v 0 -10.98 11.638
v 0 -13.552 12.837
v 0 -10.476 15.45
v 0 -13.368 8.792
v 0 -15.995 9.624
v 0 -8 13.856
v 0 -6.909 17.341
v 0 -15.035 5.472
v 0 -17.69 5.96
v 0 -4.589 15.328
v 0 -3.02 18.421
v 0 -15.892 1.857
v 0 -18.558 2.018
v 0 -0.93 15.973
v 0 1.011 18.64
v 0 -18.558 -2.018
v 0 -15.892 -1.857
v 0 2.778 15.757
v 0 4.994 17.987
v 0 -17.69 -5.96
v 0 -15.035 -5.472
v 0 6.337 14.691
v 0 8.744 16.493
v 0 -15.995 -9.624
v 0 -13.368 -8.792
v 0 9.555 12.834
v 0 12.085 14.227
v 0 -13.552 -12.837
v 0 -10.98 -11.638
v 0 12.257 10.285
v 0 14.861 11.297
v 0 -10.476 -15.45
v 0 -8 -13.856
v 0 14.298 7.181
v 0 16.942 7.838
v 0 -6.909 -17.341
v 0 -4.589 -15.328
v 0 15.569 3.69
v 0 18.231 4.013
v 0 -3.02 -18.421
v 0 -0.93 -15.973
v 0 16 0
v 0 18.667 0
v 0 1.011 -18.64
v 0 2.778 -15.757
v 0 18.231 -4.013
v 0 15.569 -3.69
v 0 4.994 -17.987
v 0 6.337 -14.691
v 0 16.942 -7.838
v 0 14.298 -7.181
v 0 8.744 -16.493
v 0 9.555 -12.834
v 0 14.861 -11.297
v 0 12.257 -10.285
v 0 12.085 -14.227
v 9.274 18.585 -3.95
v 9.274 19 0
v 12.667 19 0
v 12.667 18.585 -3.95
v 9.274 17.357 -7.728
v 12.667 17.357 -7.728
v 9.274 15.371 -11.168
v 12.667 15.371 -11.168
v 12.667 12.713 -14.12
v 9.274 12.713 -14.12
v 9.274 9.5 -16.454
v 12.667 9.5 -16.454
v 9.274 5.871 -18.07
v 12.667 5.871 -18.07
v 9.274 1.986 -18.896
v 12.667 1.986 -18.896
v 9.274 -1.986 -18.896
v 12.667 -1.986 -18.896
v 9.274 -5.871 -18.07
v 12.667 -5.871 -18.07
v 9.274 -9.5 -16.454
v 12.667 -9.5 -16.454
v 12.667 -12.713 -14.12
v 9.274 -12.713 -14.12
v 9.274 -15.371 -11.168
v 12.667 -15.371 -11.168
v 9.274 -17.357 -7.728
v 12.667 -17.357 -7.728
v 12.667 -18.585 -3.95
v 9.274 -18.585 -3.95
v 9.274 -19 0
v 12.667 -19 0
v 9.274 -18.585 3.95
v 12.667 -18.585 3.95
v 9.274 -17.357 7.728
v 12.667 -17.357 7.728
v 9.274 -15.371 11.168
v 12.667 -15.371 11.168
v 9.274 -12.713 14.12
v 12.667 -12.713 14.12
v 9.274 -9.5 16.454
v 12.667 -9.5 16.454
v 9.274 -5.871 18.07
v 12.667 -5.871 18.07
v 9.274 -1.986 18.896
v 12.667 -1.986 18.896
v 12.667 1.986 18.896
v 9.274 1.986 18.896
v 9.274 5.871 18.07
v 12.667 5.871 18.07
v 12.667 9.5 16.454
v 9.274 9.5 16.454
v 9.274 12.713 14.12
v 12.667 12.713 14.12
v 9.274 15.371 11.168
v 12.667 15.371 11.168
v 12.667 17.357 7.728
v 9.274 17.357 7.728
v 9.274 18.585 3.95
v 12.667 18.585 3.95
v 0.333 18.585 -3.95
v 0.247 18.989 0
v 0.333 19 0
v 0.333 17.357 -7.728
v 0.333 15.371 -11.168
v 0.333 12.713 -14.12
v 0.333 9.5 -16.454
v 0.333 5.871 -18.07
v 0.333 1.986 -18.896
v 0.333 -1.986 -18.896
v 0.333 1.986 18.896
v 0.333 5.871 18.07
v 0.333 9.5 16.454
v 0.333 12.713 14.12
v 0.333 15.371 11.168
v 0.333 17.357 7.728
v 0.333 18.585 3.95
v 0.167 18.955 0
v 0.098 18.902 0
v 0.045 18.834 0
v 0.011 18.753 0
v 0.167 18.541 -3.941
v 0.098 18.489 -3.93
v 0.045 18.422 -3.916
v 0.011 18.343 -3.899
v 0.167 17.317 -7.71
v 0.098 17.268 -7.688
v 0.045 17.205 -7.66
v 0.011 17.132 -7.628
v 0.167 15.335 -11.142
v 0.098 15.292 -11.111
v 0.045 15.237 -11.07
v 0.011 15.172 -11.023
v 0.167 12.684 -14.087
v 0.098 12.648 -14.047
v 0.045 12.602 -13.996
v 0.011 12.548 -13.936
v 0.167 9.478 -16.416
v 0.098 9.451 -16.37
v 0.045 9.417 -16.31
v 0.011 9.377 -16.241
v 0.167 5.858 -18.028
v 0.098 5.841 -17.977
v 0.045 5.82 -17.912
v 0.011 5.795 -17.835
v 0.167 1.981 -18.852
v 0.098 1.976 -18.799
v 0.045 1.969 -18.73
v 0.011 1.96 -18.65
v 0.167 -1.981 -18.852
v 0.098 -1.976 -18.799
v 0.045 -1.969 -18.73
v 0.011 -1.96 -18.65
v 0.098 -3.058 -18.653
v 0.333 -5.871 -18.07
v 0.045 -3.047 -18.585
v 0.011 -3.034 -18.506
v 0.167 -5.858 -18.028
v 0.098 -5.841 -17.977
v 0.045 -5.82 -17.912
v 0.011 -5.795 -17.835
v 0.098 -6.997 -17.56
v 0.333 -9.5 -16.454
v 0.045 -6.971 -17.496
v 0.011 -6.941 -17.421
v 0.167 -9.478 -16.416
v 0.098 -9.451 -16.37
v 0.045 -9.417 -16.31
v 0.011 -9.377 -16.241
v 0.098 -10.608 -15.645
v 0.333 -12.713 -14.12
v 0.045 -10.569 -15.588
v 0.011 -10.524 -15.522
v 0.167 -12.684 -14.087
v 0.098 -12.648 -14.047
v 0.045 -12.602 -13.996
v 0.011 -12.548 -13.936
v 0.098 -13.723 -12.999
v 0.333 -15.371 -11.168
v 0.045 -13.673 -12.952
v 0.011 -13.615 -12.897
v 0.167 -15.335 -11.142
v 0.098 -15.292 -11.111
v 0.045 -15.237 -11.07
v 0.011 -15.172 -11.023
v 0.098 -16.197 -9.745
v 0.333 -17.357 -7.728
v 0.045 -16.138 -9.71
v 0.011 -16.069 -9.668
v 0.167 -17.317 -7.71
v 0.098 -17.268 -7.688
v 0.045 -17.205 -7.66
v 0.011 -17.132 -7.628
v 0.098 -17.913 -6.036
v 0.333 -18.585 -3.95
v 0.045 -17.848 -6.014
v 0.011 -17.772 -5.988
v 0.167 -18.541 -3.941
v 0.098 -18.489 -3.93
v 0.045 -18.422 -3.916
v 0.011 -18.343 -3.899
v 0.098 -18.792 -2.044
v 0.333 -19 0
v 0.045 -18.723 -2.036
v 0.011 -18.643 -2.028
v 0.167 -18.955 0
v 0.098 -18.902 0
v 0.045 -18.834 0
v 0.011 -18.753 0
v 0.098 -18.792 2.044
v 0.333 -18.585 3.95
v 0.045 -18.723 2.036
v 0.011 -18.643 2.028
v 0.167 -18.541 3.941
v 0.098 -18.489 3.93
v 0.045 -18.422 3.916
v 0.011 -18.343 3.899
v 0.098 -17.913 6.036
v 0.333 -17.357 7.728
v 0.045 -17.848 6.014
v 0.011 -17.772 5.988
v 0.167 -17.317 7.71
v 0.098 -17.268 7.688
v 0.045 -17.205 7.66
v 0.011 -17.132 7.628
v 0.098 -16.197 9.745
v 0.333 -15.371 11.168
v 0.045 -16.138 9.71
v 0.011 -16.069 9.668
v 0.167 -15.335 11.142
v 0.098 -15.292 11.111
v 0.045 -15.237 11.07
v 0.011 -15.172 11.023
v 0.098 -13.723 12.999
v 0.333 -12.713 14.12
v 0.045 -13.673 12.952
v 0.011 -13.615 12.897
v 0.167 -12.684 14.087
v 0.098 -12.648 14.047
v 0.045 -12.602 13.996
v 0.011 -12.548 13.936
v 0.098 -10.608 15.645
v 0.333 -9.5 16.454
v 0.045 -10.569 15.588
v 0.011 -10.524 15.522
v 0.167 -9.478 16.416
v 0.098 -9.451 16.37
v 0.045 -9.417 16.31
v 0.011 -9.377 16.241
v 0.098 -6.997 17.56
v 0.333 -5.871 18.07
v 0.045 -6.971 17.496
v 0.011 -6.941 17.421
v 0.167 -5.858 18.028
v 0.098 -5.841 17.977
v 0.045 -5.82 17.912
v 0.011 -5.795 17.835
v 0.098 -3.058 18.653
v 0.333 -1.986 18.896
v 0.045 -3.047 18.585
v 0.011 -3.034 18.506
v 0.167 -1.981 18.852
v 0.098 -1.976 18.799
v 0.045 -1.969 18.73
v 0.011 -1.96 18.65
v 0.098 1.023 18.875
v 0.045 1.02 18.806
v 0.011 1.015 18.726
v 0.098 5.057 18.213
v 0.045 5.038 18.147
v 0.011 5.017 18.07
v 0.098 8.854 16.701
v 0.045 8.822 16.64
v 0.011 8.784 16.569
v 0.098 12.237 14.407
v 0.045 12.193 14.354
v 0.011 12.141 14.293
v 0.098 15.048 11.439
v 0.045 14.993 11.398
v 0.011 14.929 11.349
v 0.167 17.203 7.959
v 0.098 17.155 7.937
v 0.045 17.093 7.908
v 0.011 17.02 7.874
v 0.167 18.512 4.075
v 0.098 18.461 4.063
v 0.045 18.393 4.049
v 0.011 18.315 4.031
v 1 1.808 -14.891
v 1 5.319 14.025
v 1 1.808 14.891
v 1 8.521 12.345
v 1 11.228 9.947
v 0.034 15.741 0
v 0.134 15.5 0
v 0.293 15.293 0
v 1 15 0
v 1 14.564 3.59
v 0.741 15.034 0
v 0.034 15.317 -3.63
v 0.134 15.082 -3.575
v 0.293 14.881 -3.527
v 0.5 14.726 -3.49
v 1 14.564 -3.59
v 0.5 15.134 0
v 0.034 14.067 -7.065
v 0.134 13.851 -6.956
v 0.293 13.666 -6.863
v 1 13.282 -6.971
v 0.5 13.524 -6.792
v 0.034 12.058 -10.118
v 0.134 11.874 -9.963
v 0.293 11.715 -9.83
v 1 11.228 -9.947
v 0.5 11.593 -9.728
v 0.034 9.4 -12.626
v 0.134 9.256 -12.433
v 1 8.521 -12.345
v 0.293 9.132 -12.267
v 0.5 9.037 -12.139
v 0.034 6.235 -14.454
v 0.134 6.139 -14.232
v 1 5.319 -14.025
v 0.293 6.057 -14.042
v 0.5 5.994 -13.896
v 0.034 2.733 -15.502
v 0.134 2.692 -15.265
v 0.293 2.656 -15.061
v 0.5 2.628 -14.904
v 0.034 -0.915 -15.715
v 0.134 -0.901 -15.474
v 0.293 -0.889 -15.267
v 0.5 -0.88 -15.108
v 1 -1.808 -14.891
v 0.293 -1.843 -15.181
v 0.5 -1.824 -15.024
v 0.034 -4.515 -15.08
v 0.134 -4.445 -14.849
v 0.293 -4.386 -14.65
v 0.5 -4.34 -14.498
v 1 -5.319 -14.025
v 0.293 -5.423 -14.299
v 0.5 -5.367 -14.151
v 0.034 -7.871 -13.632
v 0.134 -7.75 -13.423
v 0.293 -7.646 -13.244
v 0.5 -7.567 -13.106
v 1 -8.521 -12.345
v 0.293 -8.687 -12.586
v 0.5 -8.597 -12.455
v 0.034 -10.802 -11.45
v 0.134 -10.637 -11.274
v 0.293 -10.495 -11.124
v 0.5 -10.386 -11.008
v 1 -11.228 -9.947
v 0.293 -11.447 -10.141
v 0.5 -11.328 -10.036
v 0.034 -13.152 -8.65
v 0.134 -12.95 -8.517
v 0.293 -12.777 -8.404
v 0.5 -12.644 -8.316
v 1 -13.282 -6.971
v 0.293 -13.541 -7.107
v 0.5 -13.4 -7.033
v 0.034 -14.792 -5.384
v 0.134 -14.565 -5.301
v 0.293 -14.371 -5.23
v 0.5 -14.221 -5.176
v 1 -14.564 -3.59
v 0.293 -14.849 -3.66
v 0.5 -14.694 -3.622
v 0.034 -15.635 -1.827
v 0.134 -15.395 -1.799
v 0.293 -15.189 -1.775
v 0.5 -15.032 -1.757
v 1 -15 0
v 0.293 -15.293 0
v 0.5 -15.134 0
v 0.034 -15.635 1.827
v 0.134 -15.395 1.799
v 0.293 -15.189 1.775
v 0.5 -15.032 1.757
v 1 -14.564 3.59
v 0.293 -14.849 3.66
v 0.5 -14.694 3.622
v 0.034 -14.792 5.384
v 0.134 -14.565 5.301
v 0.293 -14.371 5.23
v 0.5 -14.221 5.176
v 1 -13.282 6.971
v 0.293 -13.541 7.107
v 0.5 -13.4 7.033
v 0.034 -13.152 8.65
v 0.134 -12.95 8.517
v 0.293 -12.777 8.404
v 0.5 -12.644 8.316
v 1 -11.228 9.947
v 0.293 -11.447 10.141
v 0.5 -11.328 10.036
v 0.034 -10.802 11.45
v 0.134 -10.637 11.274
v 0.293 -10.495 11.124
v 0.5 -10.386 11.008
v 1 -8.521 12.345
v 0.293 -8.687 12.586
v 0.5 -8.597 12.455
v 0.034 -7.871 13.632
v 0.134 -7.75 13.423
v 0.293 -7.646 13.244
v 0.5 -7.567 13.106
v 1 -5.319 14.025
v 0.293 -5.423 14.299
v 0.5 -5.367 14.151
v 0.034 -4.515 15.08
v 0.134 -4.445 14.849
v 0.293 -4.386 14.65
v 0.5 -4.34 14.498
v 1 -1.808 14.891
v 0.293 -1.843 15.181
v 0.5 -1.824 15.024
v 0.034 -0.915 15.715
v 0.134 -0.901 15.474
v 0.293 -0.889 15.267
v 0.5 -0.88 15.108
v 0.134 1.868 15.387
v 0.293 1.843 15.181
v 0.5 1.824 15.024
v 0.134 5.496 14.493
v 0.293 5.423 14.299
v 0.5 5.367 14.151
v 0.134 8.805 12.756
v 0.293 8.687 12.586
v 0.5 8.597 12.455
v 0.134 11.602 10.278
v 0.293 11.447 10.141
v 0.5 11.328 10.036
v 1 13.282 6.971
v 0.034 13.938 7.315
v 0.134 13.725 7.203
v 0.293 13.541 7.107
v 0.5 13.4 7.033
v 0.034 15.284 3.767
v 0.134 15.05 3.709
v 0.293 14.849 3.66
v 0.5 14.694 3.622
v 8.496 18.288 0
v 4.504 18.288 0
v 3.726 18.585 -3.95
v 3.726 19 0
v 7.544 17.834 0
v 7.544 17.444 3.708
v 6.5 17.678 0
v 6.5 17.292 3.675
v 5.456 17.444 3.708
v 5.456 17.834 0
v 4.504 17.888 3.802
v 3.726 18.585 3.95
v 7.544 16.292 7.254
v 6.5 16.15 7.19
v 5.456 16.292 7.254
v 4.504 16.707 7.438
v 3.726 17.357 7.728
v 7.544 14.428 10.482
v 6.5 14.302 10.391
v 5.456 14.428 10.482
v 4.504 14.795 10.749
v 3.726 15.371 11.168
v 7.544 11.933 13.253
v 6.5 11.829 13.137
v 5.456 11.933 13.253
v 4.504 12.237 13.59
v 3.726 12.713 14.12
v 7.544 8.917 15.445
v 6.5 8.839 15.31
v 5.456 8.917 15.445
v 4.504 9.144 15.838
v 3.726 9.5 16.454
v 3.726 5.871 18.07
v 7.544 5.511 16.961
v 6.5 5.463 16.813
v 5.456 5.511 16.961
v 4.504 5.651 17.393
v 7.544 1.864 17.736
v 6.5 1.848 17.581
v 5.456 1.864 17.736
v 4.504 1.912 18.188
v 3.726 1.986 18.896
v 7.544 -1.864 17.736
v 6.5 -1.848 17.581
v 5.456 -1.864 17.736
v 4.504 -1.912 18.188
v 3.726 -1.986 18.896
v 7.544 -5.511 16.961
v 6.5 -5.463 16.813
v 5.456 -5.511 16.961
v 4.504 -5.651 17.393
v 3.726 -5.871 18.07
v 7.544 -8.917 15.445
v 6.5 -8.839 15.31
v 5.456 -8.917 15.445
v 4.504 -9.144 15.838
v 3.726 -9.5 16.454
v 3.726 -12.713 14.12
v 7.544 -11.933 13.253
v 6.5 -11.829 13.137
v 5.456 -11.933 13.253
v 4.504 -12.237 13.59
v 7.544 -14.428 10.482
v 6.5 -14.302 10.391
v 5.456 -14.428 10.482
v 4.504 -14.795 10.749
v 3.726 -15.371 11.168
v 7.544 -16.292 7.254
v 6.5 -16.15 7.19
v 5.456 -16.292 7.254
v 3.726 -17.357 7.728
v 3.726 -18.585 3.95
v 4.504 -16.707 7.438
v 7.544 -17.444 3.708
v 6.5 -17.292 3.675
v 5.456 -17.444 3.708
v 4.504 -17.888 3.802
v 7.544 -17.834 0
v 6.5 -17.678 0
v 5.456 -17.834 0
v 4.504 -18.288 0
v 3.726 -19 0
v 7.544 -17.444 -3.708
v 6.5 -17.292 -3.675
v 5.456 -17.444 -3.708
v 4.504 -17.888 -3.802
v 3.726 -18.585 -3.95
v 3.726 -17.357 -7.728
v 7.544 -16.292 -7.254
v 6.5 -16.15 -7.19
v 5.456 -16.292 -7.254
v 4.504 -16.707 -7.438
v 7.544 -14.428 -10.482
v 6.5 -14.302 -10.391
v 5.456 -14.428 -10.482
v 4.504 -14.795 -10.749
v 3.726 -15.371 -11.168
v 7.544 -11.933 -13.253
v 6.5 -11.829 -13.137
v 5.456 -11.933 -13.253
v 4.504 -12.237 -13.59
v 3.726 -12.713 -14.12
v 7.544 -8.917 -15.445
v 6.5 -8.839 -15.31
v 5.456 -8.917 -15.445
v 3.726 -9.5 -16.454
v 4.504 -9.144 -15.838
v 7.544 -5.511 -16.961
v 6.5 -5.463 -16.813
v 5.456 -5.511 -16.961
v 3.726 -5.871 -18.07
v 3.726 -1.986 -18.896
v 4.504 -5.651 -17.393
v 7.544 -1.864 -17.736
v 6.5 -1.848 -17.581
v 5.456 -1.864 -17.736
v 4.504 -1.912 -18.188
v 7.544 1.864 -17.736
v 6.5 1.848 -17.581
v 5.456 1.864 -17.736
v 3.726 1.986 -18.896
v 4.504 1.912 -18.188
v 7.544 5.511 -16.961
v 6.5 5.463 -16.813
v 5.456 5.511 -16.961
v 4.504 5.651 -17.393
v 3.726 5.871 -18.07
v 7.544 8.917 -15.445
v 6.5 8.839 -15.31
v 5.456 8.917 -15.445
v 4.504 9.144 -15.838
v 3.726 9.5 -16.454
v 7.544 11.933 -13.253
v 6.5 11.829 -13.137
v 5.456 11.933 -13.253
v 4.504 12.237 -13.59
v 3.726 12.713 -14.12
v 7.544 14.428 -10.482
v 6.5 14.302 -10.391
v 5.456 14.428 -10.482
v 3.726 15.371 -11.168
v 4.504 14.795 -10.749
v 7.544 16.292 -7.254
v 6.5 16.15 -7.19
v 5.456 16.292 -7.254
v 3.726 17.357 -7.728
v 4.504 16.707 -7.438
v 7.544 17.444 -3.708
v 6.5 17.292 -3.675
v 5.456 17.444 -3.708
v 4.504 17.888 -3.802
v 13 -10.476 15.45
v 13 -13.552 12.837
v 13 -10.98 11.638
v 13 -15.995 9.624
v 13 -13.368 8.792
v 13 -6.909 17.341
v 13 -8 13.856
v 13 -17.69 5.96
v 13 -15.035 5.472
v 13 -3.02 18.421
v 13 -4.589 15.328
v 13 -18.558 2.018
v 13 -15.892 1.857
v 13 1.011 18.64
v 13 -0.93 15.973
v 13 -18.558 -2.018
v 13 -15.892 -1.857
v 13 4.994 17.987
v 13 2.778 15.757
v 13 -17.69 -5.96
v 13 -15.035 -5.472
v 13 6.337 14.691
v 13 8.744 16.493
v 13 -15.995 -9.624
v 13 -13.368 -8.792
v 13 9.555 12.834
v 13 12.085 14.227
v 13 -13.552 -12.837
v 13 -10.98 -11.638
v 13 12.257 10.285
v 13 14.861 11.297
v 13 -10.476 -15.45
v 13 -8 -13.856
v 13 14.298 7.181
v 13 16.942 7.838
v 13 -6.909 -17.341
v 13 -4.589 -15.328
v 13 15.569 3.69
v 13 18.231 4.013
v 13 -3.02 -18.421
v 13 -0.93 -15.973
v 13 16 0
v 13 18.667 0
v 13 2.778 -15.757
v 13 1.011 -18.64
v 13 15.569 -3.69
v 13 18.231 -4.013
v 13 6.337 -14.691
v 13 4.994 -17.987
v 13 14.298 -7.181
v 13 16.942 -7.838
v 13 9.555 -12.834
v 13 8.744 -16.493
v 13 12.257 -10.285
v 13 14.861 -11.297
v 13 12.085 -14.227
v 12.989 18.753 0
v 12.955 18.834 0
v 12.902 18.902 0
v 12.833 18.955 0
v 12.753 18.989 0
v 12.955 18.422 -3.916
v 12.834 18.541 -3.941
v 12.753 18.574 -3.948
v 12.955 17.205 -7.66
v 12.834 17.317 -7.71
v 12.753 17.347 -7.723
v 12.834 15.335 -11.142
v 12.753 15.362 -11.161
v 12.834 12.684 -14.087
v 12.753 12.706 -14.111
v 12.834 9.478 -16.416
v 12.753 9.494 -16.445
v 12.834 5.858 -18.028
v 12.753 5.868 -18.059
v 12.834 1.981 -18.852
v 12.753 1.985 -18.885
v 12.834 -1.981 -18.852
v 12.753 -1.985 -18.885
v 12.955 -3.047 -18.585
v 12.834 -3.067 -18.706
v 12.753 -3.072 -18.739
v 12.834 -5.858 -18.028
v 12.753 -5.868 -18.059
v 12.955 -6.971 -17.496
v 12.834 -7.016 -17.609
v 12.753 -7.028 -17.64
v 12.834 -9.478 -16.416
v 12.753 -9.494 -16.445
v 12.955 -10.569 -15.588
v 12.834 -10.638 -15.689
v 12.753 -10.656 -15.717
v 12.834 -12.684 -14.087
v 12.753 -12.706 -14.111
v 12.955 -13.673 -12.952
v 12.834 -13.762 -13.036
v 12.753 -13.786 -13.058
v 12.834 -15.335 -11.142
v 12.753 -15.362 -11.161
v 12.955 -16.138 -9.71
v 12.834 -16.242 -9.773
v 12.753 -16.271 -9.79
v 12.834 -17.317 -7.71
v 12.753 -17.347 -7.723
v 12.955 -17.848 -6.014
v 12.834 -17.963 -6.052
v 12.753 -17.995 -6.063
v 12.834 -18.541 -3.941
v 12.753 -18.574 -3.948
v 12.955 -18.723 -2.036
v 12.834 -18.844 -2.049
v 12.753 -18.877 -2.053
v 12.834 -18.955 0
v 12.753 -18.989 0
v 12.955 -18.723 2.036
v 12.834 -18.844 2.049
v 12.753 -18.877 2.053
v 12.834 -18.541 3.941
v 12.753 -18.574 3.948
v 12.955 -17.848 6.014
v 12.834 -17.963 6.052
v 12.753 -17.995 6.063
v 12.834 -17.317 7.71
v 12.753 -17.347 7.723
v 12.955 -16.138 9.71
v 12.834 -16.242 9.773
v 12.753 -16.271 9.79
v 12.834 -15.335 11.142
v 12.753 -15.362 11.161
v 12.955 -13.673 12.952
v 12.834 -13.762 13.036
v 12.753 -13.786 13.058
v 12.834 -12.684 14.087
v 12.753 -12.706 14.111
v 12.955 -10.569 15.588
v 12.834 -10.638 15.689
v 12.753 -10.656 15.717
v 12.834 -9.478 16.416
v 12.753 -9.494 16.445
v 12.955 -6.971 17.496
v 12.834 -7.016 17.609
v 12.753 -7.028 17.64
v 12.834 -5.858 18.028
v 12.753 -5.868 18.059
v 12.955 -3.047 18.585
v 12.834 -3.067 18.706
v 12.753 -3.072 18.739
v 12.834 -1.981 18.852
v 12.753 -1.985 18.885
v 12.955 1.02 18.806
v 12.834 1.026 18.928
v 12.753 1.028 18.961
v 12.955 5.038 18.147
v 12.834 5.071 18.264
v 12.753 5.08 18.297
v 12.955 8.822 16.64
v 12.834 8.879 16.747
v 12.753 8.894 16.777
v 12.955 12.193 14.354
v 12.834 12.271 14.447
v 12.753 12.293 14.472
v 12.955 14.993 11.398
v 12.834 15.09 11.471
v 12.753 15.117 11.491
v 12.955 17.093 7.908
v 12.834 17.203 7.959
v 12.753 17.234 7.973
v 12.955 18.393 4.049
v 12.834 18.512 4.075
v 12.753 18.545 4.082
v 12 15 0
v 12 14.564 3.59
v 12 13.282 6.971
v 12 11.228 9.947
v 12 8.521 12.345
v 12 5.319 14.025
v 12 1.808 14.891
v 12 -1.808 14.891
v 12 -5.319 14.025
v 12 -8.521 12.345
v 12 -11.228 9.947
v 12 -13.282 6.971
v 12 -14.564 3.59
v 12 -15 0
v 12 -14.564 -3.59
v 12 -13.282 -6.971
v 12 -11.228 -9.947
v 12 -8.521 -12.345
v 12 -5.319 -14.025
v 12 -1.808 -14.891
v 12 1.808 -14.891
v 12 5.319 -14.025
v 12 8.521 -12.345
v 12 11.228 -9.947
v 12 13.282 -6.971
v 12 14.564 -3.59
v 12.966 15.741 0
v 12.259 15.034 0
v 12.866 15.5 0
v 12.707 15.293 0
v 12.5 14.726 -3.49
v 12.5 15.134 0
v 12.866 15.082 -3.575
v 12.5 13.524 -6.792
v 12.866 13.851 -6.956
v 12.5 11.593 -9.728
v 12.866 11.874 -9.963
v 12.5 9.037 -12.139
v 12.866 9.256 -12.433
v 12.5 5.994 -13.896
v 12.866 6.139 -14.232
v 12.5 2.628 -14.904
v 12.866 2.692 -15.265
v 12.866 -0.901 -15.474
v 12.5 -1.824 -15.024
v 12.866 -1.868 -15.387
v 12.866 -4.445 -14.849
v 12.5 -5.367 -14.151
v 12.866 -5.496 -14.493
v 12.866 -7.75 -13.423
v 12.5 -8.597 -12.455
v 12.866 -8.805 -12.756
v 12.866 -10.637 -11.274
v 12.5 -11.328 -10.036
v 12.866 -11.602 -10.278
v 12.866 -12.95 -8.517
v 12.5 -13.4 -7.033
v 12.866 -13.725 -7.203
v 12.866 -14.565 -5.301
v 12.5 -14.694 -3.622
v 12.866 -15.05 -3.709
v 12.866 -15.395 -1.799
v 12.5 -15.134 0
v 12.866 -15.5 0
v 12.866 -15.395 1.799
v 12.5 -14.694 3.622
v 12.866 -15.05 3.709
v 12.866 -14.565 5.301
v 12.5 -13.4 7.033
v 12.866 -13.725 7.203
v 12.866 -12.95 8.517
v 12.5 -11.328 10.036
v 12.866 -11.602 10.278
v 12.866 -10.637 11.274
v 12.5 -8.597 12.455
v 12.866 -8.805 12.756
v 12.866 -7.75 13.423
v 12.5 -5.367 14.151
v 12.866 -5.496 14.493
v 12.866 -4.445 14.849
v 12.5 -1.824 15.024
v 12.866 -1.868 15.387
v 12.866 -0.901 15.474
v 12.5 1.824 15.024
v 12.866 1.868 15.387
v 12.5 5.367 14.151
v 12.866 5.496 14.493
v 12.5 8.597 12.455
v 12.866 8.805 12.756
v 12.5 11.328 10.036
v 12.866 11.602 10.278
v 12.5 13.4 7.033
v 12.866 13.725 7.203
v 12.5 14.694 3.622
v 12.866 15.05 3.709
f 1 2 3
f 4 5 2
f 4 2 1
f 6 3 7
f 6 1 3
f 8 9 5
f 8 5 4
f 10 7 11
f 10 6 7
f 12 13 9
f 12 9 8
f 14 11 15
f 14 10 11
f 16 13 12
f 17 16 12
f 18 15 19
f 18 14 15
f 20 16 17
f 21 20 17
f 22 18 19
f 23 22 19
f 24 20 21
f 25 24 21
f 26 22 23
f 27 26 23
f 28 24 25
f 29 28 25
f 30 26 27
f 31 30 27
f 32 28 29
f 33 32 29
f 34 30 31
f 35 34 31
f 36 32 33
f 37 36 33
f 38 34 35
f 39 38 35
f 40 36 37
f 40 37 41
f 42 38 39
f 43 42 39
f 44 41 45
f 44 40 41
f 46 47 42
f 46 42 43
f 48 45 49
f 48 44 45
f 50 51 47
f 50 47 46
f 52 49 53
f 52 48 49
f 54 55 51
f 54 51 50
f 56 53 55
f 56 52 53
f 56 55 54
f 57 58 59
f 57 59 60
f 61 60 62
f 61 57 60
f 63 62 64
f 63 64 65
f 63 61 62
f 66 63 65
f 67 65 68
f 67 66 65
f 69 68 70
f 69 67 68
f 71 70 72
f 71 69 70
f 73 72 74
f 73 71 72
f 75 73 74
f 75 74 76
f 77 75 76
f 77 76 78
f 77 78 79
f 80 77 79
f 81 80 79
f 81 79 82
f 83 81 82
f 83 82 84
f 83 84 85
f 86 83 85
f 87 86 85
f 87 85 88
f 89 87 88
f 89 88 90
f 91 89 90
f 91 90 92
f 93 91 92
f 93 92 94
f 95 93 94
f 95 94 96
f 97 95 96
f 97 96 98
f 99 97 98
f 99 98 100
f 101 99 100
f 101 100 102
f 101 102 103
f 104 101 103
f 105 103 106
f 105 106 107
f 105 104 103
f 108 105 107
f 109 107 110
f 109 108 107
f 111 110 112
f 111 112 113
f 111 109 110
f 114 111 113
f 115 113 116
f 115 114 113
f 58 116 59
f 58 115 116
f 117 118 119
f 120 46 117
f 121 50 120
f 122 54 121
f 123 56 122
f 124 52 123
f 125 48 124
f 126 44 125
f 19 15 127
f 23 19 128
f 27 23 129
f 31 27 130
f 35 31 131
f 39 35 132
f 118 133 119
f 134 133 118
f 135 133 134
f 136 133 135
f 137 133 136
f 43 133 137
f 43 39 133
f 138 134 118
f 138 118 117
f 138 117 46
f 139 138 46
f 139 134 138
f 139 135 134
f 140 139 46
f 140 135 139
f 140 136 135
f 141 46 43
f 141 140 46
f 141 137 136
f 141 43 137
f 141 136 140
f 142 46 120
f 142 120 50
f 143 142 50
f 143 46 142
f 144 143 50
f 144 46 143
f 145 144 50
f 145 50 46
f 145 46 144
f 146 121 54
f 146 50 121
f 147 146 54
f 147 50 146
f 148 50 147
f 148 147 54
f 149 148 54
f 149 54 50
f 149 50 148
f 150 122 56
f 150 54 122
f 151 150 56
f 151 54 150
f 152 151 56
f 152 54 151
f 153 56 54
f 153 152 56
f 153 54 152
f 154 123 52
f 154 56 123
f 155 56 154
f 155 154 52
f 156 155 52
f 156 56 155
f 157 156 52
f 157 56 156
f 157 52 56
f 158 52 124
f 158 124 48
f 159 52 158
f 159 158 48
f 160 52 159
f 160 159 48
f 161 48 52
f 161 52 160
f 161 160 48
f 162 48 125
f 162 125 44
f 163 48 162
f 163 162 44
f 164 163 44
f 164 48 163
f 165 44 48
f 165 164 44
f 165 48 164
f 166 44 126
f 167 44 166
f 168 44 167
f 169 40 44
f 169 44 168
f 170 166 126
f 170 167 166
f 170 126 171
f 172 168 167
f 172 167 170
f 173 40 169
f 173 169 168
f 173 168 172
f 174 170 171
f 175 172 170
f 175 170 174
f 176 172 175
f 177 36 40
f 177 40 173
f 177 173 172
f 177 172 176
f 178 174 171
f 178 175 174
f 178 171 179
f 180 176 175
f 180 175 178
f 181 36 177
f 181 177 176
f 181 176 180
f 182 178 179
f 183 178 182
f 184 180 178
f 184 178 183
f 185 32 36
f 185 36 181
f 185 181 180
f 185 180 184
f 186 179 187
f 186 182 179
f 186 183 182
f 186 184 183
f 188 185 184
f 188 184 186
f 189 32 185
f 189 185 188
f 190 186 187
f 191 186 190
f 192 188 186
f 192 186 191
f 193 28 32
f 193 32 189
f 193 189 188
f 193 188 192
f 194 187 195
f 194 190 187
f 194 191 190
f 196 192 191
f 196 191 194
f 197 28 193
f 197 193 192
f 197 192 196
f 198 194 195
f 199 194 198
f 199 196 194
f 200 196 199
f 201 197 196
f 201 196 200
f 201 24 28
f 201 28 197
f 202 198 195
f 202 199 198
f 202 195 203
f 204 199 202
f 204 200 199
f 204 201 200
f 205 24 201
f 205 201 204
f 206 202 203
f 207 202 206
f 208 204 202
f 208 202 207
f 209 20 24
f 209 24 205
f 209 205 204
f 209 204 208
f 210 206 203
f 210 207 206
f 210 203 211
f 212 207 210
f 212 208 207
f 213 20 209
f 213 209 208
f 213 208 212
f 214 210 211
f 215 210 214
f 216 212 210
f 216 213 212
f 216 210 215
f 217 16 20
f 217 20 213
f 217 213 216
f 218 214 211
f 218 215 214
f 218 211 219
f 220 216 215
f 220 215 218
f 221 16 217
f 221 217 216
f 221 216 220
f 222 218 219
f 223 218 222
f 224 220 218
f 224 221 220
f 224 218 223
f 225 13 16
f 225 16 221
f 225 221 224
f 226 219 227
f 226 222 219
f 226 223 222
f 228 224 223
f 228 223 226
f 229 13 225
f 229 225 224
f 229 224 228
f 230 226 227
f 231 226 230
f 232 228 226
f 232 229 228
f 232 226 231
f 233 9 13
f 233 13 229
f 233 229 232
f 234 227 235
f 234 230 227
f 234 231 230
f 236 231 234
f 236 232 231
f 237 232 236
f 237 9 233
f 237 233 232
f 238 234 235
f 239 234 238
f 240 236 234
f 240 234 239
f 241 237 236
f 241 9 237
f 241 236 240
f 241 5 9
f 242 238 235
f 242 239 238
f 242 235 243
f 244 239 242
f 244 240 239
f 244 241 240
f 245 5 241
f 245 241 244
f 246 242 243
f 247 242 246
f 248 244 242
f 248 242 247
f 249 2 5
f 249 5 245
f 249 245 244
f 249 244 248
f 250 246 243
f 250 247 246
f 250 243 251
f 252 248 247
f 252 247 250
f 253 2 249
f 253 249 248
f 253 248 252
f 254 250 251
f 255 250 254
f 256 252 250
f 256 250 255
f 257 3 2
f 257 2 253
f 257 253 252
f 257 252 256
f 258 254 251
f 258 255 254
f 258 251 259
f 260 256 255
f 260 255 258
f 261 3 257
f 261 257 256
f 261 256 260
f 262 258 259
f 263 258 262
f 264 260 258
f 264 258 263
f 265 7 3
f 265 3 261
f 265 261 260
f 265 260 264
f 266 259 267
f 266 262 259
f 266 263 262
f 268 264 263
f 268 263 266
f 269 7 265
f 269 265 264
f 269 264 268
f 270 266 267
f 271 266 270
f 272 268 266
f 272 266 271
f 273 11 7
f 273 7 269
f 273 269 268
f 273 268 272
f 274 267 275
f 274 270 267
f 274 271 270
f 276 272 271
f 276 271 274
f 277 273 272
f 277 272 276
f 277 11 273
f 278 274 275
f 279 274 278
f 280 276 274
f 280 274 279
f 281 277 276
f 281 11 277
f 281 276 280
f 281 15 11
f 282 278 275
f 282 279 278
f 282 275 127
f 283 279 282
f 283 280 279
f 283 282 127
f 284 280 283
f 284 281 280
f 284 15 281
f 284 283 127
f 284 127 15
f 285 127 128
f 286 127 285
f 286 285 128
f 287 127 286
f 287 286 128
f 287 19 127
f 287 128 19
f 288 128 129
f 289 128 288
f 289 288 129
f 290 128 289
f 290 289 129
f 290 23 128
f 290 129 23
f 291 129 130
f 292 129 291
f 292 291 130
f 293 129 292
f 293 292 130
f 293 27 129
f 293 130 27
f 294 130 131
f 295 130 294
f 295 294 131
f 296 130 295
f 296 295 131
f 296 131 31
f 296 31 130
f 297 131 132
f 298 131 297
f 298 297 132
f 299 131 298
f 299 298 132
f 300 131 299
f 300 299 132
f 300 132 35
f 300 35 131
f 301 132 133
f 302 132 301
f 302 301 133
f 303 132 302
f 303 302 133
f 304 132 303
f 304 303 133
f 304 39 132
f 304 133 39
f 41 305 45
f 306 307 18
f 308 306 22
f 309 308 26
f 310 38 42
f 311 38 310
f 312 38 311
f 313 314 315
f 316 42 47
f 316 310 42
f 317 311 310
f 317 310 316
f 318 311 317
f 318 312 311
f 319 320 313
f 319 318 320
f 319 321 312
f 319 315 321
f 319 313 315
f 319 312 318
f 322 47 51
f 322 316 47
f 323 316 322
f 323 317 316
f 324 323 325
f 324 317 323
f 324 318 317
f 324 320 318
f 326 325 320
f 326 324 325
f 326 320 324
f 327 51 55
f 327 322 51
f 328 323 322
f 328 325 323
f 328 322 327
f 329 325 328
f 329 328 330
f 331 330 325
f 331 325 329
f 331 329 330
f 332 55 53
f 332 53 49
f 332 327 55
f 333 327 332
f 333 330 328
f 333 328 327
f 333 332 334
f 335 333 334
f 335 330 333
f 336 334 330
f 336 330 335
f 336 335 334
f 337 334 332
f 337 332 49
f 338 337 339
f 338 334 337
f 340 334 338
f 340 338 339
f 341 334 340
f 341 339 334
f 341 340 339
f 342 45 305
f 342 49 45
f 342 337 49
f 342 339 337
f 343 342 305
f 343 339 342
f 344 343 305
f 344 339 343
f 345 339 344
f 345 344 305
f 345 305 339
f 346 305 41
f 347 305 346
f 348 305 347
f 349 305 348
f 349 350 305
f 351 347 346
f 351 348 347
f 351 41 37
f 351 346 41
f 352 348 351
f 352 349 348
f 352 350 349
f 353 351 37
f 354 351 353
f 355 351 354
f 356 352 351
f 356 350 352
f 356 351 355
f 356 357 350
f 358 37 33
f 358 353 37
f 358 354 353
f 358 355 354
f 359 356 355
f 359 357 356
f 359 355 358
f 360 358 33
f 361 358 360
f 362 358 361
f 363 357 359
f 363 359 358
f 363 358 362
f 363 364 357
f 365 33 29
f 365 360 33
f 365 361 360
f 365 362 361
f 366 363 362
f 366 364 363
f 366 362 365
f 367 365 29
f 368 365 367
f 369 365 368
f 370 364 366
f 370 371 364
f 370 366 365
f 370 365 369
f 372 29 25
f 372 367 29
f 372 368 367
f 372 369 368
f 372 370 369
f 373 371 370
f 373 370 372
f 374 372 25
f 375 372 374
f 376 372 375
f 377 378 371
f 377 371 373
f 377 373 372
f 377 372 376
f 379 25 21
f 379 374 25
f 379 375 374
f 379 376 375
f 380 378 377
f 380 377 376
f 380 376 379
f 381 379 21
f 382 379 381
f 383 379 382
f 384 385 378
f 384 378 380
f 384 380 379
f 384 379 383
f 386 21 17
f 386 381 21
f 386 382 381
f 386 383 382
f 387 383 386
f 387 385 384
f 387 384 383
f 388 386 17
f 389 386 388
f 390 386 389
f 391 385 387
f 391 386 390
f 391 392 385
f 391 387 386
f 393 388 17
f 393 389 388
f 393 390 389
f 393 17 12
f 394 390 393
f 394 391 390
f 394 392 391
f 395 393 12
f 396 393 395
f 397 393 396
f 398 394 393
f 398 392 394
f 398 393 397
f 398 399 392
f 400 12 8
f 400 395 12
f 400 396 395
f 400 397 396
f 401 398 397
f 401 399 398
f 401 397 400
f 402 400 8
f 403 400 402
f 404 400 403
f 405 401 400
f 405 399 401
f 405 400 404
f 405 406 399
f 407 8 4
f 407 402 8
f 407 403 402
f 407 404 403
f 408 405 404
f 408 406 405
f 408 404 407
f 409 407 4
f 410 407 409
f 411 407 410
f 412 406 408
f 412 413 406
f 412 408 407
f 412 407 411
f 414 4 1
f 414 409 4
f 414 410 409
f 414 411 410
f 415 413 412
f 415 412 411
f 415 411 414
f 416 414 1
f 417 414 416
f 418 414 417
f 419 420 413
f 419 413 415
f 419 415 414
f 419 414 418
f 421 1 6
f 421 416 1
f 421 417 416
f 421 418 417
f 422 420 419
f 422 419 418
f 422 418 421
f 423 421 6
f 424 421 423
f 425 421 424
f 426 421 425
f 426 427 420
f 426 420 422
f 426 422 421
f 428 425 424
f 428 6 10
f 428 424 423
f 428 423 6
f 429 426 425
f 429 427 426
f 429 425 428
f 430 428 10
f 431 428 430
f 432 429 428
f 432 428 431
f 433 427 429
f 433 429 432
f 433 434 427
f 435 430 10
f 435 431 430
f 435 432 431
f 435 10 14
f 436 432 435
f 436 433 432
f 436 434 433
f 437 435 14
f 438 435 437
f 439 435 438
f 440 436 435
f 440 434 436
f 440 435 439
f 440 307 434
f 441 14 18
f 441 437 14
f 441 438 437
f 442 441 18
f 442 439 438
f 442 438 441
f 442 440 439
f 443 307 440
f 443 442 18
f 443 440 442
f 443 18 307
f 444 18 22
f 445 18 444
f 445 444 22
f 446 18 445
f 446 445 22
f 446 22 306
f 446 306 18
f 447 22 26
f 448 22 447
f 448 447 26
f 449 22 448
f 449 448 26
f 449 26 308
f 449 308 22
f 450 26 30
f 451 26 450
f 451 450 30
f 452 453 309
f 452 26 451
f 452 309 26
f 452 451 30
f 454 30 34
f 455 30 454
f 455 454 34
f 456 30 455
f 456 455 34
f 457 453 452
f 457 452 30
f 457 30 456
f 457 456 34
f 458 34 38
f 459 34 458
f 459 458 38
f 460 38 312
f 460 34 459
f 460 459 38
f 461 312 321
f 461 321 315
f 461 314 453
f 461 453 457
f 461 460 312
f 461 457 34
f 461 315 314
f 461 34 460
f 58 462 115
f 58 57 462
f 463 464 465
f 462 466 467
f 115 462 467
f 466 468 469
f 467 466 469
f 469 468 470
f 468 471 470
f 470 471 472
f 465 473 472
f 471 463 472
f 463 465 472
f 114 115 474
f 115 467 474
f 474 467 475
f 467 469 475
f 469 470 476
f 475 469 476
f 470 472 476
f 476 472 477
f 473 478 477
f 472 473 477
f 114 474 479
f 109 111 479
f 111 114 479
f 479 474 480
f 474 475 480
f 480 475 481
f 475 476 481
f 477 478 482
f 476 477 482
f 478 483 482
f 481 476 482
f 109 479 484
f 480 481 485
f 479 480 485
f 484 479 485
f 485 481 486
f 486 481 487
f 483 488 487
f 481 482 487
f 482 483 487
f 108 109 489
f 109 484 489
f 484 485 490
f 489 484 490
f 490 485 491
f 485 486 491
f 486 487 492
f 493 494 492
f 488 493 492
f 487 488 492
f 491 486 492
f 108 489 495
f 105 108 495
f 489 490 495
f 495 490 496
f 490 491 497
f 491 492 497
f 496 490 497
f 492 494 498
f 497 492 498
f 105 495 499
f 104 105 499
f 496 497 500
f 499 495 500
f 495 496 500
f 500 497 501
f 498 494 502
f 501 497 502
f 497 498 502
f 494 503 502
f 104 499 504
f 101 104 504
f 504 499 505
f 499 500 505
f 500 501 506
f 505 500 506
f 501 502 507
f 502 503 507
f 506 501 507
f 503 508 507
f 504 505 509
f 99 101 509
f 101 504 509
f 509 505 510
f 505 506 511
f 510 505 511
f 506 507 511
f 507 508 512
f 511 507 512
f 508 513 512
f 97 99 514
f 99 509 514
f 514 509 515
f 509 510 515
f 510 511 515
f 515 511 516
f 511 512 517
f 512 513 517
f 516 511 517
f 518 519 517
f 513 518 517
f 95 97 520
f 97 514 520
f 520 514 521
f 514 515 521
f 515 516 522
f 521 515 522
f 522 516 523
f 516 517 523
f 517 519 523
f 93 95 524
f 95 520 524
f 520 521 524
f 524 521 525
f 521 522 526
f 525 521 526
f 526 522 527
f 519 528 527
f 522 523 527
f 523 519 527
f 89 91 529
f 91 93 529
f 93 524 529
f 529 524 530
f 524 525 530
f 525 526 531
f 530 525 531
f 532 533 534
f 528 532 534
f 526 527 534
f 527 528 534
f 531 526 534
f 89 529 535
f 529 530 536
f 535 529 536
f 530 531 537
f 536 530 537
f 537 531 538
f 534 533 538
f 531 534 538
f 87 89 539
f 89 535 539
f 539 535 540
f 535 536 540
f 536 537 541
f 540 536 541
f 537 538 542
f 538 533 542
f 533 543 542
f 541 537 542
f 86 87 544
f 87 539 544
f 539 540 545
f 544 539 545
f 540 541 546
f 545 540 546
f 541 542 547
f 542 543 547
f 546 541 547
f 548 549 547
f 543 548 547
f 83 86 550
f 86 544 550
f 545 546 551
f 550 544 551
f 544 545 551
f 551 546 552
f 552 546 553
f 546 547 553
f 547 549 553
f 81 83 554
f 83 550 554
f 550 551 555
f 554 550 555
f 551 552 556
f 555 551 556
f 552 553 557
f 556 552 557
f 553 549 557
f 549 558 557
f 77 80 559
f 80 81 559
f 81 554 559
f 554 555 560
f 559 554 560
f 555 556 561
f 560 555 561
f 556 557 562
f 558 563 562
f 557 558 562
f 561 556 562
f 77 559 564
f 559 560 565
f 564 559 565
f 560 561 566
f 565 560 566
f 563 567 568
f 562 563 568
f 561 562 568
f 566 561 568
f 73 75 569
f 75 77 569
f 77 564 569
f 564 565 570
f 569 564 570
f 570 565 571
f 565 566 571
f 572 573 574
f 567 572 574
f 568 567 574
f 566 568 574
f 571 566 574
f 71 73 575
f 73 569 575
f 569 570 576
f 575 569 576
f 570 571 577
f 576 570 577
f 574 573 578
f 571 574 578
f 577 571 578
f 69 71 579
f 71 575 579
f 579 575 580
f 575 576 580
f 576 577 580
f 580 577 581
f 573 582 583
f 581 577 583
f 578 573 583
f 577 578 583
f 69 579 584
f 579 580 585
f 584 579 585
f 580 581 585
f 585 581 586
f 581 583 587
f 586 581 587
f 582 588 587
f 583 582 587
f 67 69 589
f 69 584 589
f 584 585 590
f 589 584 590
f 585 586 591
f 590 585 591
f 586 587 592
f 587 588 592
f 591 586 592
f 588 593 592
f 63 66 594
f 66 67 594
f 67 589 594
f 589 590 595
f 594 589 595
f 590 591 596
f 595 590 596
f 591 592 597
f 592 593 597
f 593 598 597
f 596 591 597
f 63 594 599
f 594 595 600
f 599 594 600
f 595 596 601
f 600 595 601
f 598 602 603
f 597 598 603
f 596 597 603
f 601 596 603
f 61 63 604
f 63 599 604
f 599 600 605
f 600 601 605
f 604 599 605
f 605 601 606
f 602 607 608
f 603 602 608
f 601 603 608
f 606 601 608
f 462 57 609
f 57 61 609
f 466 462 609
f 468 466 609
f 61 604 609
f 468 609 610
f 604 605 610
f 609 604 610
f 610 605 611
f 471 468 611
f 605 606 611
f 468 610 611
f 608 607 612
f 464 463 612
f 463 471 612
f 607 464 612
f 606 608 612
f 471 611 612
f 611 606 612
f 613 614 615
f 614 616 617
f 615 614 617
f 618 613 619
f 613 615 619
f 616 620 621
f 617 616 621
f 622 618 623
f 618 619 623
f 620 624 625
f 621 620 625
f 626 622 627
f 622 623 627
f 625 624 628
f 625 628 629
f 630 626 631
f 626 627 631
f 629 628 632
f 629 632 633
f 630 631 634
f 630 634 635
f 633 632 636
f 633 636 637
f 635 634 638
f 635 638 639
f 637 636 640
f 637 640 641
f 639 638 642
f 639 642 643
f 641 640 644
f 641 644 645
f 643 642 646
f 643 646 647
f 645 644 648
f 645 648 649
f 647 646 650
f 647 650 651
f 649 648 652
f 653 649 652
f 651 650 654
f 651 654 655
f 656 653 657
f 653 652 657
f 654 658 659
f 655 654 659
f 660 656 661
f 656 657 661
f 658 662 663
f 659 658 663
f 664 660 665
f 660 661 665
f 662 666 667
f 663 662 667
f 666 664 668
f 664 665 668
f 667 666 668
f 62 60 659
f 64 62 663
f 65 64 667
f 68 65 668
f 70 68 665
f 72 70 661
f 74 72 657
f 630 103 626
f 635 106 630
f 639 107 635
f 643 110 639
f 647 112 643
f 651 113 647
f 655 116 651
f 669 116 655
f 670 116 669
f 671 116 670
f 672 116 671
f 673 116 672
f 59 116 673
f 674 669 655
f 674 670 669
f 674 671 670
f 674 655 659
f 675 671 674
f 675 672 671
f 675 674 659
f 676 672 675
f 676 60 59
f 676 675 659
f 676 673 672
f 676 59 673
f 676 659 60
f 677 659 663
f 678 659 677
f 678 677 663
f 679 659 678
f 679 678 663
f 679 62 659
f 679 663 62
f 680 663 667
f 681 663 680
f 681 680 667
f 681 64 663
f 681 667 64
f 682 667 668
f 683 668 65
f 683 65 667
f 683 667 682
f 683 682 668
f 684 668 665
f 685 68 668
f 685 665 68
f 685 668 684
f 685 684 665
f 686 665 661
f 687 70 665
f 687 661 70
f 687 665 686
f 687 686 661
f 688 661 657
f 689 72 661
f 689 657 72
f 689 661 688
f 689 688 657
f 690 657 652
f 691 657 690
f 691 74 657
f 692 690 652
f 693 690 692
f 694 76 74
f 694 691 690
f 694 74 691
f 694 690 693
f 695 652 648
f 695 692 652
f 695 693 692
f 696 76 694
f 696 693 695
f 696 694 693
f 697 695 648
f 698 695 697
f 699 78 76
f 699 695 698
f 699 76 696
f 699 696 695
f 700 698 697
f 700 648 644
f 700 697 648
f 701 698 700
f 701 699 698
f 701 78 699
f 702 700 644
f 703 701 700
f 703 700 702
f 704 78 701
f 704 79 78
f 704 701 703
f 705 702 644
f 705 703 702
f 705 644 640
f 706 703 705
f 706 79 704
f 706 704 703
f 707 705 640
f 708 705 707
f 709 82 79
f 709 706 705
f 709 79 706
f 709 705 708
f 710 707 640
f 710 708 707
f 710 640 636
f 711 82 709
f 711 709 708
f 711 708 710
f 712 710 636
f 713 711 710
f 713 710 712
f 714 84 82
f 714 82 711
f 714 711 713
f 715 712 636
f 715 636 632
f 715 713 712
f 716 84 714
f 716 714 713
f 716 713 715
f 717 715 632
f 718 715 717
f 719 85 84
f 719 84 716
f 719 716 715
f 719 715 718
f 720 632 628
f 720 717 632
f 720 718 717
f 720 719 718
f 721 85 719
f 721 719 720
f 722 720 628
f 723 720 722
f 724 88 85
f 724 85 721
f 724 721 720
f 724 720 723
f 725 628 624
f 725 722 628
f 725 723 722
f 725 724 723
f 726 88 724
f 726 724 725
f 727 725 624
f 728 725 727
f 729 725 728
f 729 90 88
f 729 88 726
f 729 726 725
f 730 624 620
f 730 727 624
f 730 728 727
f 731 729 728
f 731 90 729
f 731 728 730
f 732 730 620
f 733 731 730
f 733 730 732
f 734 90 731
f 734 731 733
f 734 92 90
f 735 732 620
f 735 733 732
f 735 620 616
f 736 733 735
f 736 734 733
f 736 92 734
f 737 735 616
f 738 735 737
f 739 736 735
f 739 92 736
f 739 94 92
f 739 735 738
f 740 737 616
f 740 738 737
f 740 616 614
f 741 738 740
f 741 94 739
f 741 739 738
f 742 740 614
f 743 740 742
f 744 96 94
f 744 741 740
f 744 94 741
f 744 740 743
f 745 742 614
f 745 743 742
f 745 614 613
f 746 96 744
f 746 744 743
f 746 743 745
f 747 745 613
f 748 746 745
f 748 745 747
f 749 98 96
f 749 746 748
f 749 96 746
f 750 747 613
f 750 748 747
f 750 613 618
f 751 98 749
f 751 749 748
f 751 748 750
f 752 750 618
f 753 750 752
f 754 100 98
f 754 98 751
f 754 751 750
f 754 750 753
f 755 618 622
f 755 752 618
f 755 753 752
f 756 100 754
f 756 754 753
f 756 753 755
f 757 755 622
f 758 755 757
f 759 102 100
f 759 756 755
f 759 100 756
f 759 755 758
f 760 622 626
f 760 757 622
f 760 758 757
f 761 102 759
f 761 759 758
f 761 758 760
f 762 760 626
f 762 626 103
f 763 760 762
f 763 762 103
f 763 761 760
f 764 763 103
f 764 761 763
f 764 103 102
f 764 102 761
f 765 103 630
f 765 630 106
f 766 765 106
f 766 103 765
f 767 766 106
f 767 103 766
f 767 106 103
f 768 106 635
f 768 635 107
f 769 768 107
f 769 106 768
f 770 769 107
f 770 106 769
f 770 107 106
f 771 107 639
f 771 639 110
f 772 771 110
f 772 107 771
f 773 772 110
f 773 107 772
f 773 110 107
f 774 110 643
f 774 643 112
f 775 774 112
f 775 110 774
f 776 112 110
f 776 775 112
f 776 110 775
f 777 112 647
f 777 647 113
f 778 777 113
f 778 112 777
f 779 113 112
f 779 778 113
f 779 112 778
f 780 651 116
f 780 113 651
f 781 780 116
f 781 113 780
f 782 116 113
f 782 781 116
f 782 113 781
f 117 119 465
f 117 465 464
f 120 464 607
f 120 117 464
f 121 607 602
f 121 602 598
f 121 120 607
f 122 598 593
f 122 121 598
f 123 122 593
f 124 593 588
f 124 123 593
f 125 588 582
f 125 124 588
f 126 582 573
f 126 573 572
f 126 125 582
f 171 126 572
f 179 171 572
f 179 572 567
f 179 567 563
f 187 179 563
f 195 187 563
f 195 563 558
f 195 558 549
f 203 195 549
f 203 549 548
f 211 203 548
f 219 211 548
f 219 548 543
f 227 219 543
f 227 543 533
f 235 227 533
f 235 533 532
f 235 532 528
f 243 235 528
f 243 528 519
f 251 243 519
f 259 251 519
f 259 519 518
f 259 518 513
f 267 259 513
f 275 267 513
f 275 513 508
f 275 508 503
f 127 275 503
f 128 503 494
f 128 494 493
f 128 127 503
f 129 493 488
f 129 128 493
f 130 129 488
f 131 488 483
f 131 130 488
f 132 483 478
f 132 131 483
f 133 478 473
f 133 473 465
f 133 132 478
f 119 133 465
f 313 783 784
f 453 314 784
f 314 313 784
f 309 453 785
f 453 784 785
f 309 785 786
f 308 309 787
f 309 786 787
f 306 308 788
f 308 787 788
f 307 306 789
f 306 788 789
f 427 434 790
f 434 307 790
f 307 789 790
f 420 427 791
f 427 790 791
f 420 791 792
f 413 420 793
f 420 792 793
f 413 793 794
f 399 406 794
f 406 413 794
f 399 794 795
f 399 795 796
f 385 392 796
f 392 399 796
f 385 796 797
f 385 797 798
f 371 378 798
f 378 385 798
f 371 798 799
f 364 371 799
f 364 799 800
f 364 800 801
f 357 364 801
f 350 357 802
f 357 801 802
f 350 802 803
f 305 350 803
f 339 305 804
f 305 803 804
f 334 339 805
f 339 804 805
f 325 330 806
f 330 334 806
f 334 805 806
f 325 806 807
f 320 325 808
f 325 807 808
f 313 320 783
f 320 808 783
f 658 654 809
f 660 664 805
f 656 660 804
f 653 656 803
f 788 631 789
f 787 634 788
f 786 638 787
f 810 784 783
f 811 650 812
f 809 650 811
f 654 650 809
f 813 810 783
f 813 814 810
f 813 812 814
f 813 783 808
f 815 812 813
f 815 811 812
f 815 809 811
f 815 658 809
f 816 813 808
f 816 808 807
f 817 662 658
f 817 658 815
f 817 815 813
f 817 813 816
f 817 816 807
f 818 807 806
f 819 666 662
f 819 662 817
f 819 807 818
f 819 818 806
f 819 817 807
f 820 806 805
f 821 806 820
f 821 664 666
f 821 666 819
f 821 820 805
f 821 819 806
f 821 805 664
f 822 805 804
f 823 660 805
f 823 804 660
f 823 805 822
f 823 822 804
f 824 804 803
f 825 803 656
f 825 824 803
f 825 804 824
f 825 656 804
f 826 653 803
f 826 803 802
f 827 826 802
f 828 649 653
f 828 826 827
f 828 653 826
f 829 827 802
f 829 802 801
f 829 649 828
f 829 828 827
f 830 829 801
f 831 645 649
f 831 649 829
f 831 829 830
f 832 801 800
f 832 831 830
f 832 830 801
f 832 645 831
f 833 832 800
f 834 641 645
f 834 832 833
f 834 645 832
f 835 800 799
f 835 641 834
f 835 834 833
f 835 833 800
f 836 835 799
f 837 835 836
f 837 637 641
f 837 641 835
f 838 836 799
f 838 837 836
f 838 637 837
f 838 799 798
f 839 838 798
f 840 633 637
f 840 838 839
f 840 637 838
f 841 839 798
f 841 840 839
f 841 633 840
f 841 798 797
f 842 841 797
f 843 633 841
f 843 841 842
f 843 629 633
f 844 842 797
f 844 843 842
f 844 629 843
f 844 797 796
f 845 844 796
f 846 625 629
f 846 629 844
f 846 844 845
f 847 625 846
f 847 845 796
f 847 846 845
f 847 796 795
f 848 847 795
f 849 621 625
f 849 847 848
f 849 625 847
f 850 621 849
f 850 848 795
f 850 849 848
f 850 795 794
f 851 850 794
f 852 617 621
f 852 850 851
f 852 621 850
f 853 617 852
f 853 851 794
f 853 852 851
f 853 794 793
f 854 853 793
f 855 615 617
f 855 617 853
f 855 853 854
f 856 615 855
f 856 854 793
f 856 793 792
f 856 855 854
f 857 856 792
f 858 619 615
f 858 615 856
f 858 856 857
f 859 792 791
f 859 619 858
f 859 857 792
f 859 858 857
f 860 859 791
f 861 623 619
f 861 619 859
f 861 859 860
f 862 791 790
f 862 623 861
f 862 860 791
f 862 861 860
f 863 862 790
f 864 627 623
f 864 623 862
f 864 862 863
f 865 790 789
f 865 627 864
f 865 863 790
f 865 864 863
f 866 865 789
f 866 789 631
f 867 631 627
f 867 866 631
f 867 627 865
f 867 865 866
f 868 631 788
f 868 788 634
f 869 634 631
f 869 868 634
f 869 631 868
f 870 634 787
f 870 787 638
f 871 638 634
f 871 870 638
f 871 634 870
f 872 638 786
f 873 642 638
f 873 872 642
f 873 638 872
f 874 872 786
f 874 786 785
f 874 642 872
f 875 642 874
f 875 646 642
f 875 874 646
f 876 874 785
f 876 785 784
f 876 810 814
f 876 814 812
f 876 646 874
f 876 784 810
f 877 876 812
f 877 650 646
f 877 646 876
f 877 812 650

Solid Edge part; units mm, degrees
sketch "Sketch1" plane through (0, 0, 0) normal (0, 0, 1) x (1, 0, 0)
  arc A0 (0, 16) -> (1, 15) centre (1, 16) ccw
  line L0 (1, 15) -> (12, 15)
  arc A1 (12, 15) -> (13, 16) centre (12, 16) ccw
  line L1 (13, 16) -> (13, 18.667)
  arc A2 (13, 18.667) -> (12.667, 19) centre (12.667, 18.667) ccw
  line L2 (12.667, 19) -> (9.2743, 19)
  arc A3 (9.2743, 19) -> (3.7257, 19) centre (6.5, 21.25) cw
  line L3 (3.7257, 19) -> (0.333, 19)
  arc A4 (0.333, 19) -> (0, 18.667) centre (0.333, 18.667) ccw
  line L4 (0, 18.667) -> (0, 16)
revolve "RevolvedProtrusion1" add sketch "Sketch1" angle 360 about axis through (12, 0, 0) along (-1, 0, 0)
properties material "Steel"
